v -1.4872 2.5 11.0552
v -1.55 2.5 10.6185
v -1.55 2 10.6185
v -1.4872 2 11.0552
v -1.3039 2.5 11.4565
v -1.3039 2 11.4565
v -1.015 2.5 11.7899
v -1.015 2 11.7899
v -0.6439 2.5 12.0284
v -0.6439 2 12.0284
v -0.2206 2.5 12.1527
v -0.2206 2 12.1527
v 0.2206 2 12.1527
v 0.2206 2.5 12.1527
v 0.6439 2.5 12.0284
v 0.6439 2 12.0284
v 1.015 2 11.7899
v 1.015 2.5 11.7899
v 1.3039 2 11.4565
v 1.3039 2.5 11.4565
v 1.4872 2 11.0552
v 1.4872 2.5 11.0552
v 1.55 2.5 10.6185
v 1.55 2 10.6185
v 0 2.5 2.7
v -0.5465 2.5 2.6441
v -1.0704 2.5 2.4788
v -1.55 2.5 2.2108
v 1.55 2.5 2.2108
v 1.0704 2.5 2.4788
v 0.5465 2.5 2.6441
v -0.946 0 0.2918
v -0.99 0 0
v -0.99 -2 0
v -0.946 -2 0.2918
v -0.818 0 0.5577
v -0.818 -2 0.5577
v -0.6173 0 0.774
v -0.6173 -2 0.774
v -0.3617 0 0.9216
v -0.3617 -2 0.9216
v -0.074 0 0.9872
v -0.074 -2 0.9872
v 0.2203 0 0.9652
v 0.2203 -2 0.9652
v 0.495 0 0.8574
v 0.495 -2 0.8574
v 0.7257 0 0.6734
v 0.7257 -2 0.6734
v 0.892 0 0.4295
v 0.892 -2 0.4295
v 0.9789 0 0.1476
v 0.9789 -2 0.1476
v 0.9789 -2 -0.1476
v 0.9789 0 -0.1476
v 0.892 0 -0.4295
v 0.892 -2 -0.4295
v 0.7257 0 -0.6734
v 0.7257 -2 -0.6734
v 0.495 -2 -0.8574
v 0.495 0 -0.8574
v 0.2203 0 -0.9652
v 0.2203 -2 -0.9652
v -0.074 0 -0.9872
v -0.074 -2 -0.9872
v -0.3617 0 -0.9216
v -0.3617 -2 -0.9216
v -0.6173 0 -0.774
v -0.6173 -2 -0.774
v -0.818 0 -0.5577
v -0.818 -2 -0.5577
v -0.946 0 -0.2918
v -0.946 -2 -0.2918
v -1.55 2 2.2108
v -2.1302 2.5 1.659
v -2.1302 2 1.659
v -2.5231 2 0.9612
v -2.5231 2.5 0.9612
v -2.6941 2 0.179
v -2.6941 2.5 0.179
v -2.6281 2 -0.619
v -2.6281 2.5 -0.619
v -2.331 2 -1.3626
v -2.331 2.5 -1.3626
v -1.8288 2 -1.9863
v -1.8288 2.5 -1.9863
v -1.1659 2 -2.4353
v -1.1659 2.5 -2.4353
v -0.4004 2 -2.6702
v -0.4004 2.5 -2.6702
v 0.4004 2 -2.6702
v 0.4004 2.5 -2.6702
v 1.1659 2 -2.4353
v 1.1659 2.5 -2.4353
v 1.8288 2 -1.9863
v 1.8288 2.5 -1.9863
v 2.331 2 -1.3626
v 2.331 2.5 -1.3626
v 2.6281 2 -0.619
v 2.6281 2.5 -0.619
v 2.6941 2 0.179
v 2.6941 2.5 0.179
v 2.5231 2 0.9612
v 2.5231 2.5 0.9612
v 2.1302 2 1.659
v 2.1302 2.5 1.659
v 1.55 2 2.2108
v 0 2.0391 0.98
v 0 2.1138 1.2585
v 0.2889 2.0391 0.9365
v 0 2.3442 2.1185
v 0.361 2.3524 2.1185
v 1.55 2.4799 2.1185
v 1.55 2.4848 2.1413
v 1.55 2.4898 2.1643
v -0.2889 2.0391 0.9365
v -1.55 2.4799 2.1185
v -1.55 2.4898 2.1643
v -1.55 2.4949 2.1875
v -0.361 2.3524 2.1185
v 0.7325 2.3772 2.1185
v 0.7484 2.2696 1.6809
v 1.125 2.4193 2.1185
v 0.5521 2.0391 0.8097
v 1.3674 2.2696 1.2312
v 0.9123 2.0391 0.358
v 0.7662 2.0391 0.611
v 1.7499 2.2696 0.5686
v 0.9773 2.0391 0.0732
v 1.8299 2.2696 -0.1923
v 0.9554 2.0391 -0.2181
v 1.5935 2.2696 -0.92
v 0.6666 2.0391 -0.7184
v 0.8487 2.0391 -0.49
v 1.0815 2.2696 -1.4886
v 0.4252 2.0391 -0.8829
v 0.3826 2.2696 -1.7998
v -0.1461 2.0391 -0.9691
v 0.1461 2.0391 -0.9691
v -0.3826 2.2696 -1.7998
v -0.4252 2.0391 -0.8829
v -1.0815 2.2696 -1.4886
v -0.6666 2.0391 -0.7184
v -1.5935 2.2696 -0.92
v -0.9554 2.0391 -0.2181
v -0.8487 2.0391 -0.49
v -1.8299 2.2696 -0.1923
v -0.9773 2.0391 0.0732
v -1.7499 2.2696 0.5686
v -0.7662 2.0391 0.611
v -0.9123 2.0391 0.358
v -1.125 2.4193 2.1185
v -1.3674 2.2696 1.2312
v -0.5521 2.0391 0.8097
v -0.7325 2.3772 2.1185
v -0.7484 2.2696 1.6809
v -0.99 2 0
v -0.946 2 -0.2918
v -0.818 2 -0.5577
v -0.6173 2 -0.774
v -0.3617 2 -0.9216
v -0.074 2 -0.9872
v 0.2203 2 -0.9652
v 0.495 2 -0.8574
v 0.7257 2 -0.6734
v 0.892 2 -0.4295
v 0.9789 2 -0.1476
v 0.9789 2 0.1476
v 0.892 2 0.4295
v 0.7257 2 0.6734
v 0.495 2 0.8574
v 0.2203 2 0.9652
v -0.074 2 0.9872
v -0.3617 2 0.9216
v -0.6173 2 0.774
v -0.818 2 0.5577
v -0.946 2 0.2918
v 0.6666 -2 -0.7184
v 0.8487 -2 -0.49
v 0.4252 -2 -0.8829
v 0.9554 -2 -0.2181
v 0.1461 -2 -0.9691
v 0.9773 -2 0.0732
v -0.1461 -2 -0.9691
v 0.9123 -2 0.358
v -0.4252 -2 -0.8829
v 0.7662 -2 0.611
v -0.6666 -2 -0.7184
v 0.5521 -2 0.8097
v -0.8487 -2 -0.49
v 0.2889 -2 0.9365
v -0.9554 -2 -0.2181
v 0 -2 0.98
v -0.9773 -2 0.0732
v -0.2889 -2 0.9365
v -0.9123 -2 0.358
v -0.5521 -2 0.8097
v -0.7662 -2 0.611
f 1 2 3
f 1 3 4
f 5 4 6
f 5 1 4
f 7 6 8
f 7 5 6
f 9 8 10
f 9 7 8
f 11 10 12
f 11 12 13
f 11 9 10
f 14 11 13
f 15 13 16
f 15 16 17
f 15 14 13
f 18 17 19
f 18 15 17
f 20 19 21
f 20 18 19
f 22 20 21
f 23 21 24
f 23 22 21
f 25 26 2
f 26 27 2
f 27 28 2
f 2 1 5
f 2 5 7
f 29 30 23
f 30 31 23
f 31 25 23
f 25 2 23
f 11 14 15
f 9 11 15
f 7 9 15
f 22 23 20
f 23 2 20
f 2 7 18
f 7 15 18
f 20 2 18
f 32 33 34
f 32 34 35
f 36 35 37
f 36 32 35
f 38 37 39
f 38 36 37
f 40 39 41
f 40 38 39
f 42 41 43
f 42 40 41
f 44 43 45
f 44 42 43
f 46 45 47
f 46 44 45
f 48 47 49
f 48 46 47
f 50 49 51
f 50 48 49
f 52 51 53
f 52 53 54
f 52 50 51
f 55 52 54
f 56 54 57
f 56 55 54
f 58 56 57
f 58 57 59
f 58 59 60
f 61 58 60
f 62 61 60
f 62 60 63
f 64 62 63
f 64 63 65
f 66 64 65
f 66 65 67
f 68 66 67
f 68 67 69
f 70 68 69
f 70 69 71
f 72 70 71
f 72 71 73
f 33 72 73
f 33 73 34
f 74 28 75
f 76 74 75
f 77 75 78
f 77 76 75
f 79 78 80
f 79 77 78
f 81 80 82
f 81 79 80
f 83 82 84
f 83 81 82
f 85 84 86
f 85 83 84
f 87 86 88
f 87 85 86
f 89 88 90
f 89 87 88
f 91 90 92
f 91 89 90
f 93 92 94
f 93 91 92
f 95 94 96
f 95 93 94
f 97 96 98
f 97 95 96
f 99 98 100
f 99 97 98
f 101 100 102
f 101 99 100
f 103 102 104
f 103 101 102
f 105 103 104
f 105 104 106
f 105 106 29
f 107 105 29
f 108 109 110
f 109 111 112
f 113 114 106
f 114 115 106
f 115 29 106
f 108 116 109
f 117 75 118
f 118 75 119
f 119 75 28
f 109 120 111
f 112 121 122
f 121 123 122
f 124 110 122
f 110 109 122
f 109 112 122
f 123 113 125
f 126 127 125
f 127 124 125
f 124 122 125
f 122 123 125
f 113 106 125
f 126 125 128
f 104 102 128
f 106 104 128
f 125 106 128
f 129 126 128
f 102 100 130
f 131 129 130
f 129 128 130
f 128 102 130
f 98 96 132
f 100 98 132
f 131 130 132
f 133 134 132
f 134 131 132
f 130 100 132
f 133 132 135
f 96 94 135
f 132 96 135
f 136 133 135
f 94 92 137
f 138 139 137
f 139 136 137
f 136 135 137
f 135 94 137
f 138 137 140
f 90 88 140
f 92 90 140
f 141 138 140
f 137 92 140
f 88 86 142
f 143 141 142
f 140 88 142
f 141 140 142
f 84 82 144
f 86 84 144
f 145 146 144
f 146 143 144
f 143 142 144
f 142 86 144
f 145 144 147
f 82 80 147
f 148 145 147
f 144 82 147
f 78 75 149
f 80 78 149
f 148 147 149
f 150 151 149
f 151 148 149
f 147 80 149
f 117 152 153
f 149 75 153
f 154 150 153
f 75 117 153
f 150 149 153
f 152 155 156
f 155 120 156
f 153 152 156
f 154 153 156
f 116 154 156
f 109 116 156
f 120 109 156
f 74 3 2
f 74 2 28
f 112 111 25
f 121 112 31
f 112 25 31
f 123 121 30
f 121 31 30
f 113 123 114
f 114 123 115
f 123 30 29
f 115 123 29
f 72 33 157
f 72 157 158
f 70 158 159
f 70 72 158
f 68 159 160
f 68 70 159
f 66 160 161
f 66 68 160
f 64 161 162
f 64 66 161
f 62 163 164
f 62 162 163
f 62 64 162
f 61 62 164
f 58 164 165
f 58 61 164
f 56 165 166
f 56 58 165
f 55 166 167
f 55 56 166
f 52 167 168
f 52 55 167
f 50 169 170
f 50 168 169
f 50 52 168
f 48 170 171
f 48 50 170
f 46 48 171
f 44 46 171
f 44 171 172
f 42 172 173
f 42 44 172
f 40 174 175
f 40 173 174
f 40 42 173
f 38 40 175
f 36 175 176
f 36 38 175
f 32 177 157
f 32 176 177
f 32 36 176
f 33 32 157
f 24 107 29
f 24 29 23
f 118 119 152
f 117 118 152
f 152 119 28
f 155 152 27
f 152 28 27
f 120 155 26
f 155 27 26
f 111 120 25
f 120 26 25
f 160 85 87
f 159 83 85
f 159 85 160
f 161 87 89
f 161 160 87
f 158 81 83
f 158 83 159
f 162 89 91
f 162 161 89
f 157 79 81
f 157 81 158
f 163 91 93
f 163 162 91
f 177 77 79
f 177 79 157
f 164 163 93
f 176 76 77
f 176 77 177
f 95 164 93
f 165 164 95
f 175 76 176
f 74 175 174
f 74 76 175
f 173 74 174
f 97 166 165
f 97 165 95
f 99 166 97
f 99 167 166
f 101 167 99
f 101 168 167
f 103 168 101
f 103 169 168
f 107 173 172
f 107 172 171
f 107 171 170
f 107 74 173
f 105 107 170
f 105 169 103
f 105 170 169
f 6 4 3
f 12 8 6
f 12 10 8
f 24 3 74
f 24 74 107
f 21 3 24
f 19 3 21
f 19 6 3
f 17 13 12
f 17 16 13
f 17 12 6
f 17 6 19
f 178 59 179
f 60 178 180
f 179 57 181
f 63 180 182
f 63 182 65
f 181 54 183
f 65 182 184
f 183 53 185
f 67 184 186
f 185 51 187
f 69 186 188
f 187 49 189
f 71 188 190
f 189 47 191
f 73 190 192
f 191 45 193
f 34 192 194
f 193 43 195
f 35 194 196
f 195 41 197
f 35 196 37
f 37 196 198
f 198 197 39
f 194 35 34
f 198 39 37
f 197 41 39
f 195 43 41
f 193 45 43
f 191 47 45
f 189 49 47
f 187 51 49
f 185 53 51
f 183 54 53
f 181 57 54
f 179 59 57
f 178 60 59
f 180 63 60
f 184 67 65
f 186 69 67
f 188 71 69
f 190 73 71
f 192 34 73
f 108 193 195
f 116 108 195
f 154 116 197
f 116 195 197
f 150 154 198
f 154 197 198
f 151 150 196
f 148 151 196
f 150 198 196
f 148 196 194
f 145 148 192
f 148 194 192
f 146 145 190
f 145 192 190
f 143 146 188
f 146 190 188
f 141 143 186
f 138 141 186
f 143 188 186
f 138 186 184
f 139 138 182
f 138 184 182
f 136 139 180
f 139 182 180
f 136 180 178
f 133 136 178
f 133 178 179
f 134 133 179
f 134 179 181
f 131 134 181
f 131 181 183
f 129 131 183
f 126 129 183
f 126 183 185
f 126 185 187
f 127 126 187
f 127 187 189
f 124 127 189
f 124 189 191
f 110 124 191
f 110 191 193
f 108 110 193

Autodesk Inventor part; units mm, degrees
ref_plane "YZ Plane" through (0, 0, 0) normal (1, 0, 0) x (0, 1, 0)
ref_plane "XZ Plane" through (0, 0, 0) normal (0, 1, 0) x (-1, 0, 0)
ref_plane "XY Plane" through (0, 0, 0) normal (0, 0, 1) x (1, 0, 0)
sketch "Boceto1" plane through (0, 0, 0) normal (0, 1, 0) x (-1, 0, 0)
  circle A0 centre (0, 0) radius 0.99
  dimension "d0" = 1.98
extrude "Extrusión1" add sketch "Boceto1" along normal mid plane 4
sketch "Boceto2" plane through (0, 2, 0) normal (0, 1, 0) x (1, 0, 0)
  circle A0 centre (0, 0) radius 0.99 projected
  circle A1 centre (0, 0) radius 2.7
  dimension "d3" = 5.4
extrude "Extrusión2" add sketch "Boceto2" along normal blind 0.5 contours A0 | A1
hole "Hole1" at (0, 2.5, 0) direction (0, -1, 0) diameter 1.96 end through all
hole "Hole2" at (0, 2.5, 0) direction (0, -1, 0) diameter 1.96 end through all countersink diameter 5.4 countersink angle 150
sketch "Boceto3" plane through (0, 2, 0) normal (0, -1, 0) x (1, 0, 0)
  line L0 (-1.55, 2.1185) -> (1.55, 2.1185)
  line L1 (1.55, 2.1185) -> (1.55, 10.6185)
  line L2 (1.55, 10.6185) -> (-1.55, 10.6185)
  line L3 (-1.55, 10.6185) -> (-1.55, 2.1185)
  line L4 (-1.55, 2.1185) -> (1.55, 10.6185) construction
  line L5 (1.55, 2.1185) -> (-1.55, 10.6185) construction
  point P0 (0, 6.3685)
  dimension "d24" = 3.1
  dimension "d25" = 8.5
extrude "Extrusión3" add sketch "Boceto3" against normal blind 0.5
hole "Hole3" at (0, 2.5, 0) direction (0, -1, 0) diameter 1.96 end through all countersink diameter 5.4 countersink angle 150
sketch "Boceto4" plane through (0, 2.5, 0) normal (0, 1, 0) x (1, 0, 0)
  line L0 (-1.55, -10.6185) -> (1.55, -10.6185) projected
  circle A0 centre (0, -10.6185) radius 1.55
  dimension "d39" = 3.1
extrude "Extrusión4" add sketch "Boceto4" against normal blind 0.5
properties part number "Conector"
